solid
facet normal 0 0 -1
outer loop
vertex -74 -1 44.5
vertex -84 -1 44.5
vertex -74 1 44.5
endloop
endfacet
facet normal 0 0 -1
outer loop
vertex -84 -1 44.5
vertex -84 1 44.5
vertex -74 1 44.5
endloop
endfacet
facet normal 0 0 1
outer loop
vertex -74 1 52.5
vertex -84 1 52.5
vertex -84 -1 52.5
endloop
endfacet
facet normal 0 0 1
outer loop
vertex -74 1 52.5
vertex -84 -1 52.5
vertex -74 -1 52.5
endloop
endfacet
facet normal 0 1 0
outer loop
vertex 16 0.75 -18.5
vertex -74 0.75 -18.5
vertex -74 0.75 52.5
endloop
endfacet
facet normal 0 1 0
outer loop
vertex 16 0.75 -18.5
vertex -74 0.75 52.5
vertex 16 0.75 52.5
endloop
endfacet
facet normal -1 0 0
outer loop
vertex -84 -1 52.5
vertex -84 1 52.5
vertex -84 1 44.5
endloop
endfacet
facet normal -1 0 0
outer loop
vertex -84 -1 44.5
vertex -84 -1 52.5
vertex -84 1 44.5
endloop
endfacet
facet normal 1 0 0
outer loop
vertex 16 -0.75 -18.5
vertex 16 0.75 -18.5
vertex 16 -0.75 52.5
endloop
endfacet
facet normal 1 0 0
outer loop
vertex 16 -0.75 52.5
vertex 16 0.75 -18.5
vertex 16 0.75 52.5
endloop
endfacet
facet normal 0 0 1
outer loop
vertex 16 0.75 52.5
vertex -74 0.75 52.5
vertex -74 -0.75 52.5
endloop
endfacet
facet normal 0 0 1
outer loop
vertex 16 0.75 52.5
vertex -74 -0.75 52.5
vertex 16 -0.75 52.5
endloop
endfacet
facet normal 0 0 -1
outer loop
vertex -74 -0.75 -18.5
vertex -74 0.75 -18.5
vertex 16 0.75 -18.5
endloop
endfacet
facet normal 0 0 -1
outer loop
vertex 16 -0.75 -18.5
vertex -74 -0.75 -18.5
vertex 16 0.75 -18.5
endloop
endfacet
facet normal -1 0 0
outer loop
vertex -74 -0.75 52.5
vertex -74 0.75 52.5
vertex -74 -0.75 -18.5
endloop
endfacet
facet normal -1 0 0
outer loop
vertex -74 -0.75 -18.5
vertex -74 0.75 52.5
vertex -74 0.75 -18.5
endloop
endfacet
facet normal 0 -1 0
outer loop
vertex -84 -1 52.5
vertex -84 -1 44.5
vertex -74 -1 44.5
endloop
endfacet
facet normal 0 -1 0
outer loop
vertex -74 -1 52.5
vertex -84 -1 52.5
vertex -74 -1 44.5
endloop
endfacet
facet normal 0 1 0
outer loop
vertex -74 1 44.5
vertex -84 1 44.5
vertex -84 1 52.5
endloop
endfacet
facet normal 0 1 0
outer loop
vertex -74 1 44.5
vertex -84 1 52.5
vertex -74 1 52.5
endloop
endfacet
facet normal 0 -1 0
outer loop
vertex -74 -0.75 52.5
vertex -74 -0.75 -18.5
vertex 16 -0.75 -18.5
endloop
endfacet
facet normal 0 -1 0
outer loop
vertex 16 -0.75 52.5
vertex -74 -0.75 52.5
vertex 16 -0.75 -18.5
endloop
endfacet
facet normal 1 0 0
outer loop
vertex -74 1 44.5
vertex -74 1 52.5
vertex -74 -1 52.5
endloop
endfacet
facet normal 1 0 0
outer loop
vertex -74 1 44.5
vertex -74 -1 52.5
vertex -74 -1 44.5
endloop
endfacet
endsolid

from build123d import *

# Parameters (mm, degrees)
SKETCH1_W           = 148
SKETCH1_H           = 105
BOSS_EXTRUDE1_DEPTH = 0.75
SKETCH2_W           = 10
SKETCH2_H           = 8
BOSS_EXTRUDE2_DEPTH = 1
CUT_EXTRUDE1_DEPTH  = 1.5


with BuildPart() as part:
    # Sketch1 → Boss-Extrude1 (new, symmetric)
    with BuildSketch(Plane(origin=(0, 0, 0), x_dir=(1, 0, 0), z_dir=(0, 1, 0))):
        Rectangle(SKETCH1_W, SKETCH1_H)
    extrude(amount=BOSS_EXTRUDE1_DEPTH, both=True)

    # Sketch3 → Cut-Extrude1 (cut)
    with BuildSketch(Plane(origin=(0, 0.75, 0), x_dir=(1, 0, 0), z_dir=(0, 1, 0))):
        Polygon((16, 18.5), (16, -52.5), (74, -52.5), (74, 52.5), (-74, 52.5), (-74, 18.5), align=None)
    extrude(amount=-CUT_EXTRUDE1_DEPTH, mode=Mode.SUBTRACT)


with BuildPart() as body_2:
    # Sketch2 → Boss-Extrude2 (new, symmetric)
    with BuildSketch(Plane(origin=(0, 0, 0), x_dir=(1, 0, 0), z_dir=(0, 1, 0))):
        with Locations((-79, -48.5)):
            Rectangle(SKETCH2_W, SKETCH2_H)
    extrude(amount=BOSS_EXTRUDE2_DEPTH, both=True)


solid = Compound([part.part, body_2.part])
